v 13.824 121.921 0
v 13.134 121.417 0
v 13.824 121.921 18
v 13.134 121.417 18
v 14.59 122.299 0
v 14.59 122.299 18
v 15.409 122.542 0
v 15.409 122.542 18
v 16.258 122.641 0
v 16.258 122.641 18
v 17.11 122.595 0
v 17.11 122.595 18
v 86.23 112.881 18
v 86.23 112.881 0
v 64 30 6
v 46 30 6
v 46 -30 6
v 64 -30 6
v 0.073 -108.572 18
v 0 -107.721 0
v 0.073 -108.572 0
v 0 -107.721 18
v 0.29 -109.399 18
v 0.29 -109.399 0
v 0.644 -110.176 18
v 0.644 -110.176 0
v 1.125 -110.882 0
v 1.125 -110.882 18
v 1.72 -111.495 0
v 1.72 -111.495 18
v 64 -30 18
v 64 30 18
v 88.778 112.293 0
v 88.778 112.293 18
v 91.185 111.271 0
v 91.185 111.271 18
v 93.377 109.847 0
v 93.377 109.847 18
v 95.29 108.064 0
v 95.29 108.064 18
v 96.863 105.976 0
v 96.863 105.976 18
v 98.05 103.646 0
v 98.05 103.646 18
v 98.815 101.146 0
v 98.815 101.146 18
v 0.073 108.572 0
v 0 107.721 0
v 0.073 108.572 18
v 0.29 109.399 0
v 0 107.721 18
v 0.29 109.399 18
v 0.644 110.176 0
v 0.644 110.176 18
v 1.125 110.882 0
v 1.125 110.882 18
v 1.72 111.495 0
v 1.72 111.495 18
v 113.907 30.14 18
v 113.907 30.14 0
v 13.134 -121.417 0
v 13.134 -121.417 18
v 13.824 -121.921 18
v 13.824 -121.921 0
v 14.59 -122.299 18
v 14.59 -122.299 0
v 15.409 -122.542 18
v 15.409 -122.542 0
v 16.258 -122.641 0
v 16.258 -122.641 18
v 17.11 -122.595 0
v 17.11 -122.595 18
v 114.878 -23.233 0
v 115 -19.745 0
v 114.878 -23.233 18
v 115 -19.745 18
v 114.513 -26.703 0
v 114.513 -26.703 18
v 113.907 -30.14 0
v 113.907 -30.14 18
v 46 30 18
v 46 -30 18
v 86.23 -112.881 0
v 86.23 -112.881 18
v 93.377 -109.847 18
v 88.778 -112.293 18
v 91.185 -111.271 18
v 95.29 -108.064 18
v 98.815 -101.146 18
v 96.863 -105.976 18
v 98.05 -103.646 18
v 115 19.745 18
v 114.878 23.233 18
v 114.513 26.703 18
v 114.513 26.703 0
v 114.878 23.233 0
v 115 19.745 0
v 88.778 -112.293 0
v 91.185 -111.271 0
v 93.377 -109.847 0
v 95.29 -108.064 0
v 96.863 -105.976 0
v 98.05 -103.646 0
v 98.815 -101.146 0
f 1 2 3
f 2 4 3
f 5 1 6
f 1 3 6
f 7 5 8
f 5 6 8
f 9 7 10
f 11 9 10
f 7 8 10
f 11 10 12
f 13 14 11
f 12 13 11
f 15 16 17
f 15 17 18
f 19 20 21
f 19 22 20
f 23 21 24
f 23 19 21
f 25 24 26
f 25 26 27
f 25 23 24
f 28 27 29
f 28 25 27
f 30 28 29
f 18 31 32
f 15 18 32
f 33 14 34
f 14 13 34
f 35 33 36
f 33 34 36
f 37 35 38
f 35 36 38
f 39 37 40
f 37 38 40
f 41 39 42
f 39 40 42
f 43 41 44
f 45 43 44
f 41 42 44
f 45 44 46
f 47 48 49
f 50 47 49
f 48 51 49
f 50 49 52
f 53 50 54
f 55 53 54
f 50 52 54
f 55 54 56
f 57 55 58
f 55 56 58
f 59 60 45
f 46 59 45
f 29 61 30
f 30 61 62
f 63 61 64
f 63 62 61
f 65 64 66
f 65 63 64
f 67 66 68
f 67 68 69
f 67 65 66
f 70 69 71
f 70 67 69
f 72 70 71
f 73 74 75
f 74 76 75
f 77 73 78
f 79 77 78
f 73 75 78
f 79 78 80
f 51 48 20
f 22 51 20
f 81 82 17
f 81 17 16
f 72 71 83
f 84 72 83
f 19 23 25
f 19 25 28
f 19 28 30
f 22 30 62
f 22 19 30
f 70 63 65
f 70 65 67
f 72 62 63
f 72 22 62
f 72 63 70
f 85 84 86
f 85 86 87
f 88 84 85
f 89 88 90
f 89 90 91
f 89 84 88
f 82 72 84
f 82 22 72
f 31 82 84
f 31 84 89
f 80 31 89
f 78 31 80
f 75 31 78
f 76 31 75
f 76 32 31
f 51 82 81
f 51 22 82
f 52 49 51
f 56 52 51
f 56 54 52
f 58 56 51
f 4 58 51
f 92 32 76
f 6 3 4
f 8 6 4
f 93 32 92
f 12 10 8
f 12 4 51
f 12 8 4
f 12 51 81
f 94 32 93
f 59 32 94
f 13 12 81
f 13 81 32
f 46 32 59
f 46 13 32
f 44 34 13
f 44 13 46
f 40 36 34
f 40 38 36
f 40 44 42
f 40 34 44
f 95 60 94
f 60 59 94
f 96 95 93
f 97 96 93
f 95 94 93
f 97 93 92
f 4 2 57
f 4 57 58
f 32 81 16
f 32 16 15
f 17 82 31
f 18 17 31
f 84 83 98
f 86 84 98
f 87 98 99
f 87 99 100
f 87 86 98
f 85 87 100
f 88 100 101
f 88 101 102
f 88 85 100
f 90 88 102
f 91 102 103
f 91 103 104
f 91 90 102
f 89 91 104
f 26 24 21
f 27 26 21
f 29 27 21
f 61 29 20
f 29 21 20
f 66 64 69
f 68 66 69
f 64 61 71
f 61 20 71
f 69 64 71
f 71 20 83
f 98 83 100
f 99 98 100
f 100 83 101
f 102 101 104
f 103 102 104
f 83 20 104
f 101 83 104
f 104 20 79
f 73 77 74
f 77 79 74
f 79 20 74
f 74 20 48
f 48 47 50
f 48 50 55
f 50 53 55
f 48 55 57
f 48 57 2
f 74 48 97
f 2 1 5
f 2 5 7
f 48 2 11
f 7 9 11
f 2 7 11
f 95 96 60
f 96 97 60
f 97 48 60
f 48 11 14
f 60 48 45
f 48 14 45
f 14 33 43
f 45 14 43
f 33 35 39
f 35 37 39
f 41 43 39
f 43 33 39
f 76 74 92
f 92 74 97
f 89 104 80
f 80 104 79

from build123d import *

# Parameters (mm, degrees)
PAD_DEPTH    = 18
SKETCH001_W  = 18
SKETCH001_H  = 60
POCKET_DEPTH = 12
CHAMFER_SIZE = 15
FILLET_R     = 5
FILLET001_R  = 15
FILLET002_R  = 50


with BuildPart() as part:
    # Sketch → Pad (new body)
    with BuildSketch(Plane.XY):
        Polygon((0, 125), (0, -125), (96.630989, -111.4194), (115, -25), (115, 25), (96.630989, 111.4194), align=None)
    extrude(amount=PAD_DEPTH)

    # Sketch001 → Pocket (cut)
    with BuildSketch(Plane.XY.offset(18)):
        with Locations((55, 0)):
            Rectangle(SKETCH001_W, SKETCH001_H)
    extrude(amount=-POCKET_DEPTH, mode=Mode.SUBTRACT)

    # Chamfer
    chamfer_edges = [part.edges().sort_by_distance(p)[0] for p in [
        (0, -125, 9),
        (0, 125, 9),
    ]]
    chamfer(chamfer_edges, length=CHAMFER_SIZE)

    # Fillet
    fillet_edges = [part.edges().sort_by_distance(p)[0] for p in [
        (14.854021, 122.912403, 9),
        (0, 110, 9),
        (0, -110, 9),
        (14.854021, -122.912403, 9),
    ]]
    fillet(fillet_edges, radius=FILLET_R)

    # Fillet001
    fillet001_edges = [part.edges().sort_by_distance(p)[0] for p in [
        (96.630989, -111.4194, 9),
        (96.630989, 111.4194, 9),
    ]]
    fillet(fillet001_edges, radius=FILLET001_R)

    # Fillet002
    fillet002_edges = [part.edges().sort_by_distance(p)[0] for p in [
        (115, -25, 9),
        (115, 25, 9),
    ]]
    fillet(fillet002_edges, radius=FILLET002_R)


solid = part.part
